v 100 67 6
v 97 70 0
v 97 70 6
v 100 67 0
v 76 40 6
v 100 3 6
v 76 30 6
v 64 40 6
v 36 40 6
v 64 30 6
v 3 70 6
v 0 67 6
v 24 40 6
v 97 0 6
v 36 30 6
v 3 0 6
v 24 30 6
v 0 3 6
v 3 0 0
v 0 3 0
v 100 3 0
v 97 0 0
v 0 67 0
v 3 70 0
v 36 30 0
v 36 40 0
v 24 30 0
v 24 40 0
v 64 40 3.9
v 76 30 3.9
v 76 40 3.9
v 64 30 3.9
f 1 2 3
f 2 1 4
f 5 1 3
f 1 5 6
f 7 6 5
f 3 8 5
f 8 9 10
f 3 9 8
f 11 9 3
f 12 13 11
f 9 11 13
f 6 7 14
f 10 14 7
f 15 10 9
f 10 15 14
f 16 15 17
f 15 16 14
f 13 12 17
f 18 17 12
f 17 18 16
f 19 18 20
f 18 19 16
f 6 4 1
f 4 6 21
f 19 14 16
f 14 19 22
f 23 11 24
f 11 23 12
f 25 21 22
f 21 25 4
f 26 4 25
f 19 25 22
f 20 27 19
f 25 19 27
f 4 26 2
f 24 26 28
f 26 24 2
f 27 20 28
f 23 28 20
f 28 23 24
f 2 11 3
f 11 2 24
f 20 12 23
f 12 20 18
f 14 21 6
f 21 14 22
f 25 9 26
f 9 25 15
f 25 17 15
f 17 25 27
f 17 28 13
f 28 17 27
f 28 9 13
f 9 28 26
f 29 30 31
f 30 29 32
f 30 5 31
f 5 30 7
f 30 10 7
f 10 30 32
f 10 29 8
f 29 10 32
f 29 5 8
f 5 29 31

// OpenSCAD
$fn = 32;

// ----------------------------------------------------------------------
// Windowed plate: 2 voids, 100 x 70 x 6 mm
// ----------------------------------------------------------------------

// --- parameters (mm) ---
plate_l = 100;            // plate length, X
plate_w = 70;             // plate width, Y
plate_t = 6;              // plate thickness, Z
edge_margin = 10;         // wall from the plate edge to any window
windows = 2;              // number of windows in the row
win_l = 12;               // window length
win_w = 10;               // window width
win_pitch = 40;           // window pitch along X
depth_1 = 6;              // depth of void 1 (full thickness = through)
depth_2 = 2.1;            // depth of void 2 (full thickness = through)
corner_c = 3;             // corner chamfer of the plate

profile = [[3, 0], [97, 0], [100, 3], [100, 67], [97, 70], [3, 70], [0, 67], [0, 3]];  // primary outline, 8 points, counter clockwise
void_1 = [[24, 30], [36, 30], [36, 40], [24, 40]];  // window 1 of the row, 4 points
void_2 = [[64, 30], [76, 30], [76, 40], [64, 40]];  // window 2 of the row, 4 points

// --- the one profile operation ---
difference() {
  linear_extrude(height = plate_t) polygon(points = profile);
  translate([0, 0, -1])
    linear_extrude(height = plate_t + 2) polygon(points = void_1);
  translate([0, 0, plate_t - depth_2])
    linear_extrude(height = depth_2 + 1) polygon(points = void_2);
}
